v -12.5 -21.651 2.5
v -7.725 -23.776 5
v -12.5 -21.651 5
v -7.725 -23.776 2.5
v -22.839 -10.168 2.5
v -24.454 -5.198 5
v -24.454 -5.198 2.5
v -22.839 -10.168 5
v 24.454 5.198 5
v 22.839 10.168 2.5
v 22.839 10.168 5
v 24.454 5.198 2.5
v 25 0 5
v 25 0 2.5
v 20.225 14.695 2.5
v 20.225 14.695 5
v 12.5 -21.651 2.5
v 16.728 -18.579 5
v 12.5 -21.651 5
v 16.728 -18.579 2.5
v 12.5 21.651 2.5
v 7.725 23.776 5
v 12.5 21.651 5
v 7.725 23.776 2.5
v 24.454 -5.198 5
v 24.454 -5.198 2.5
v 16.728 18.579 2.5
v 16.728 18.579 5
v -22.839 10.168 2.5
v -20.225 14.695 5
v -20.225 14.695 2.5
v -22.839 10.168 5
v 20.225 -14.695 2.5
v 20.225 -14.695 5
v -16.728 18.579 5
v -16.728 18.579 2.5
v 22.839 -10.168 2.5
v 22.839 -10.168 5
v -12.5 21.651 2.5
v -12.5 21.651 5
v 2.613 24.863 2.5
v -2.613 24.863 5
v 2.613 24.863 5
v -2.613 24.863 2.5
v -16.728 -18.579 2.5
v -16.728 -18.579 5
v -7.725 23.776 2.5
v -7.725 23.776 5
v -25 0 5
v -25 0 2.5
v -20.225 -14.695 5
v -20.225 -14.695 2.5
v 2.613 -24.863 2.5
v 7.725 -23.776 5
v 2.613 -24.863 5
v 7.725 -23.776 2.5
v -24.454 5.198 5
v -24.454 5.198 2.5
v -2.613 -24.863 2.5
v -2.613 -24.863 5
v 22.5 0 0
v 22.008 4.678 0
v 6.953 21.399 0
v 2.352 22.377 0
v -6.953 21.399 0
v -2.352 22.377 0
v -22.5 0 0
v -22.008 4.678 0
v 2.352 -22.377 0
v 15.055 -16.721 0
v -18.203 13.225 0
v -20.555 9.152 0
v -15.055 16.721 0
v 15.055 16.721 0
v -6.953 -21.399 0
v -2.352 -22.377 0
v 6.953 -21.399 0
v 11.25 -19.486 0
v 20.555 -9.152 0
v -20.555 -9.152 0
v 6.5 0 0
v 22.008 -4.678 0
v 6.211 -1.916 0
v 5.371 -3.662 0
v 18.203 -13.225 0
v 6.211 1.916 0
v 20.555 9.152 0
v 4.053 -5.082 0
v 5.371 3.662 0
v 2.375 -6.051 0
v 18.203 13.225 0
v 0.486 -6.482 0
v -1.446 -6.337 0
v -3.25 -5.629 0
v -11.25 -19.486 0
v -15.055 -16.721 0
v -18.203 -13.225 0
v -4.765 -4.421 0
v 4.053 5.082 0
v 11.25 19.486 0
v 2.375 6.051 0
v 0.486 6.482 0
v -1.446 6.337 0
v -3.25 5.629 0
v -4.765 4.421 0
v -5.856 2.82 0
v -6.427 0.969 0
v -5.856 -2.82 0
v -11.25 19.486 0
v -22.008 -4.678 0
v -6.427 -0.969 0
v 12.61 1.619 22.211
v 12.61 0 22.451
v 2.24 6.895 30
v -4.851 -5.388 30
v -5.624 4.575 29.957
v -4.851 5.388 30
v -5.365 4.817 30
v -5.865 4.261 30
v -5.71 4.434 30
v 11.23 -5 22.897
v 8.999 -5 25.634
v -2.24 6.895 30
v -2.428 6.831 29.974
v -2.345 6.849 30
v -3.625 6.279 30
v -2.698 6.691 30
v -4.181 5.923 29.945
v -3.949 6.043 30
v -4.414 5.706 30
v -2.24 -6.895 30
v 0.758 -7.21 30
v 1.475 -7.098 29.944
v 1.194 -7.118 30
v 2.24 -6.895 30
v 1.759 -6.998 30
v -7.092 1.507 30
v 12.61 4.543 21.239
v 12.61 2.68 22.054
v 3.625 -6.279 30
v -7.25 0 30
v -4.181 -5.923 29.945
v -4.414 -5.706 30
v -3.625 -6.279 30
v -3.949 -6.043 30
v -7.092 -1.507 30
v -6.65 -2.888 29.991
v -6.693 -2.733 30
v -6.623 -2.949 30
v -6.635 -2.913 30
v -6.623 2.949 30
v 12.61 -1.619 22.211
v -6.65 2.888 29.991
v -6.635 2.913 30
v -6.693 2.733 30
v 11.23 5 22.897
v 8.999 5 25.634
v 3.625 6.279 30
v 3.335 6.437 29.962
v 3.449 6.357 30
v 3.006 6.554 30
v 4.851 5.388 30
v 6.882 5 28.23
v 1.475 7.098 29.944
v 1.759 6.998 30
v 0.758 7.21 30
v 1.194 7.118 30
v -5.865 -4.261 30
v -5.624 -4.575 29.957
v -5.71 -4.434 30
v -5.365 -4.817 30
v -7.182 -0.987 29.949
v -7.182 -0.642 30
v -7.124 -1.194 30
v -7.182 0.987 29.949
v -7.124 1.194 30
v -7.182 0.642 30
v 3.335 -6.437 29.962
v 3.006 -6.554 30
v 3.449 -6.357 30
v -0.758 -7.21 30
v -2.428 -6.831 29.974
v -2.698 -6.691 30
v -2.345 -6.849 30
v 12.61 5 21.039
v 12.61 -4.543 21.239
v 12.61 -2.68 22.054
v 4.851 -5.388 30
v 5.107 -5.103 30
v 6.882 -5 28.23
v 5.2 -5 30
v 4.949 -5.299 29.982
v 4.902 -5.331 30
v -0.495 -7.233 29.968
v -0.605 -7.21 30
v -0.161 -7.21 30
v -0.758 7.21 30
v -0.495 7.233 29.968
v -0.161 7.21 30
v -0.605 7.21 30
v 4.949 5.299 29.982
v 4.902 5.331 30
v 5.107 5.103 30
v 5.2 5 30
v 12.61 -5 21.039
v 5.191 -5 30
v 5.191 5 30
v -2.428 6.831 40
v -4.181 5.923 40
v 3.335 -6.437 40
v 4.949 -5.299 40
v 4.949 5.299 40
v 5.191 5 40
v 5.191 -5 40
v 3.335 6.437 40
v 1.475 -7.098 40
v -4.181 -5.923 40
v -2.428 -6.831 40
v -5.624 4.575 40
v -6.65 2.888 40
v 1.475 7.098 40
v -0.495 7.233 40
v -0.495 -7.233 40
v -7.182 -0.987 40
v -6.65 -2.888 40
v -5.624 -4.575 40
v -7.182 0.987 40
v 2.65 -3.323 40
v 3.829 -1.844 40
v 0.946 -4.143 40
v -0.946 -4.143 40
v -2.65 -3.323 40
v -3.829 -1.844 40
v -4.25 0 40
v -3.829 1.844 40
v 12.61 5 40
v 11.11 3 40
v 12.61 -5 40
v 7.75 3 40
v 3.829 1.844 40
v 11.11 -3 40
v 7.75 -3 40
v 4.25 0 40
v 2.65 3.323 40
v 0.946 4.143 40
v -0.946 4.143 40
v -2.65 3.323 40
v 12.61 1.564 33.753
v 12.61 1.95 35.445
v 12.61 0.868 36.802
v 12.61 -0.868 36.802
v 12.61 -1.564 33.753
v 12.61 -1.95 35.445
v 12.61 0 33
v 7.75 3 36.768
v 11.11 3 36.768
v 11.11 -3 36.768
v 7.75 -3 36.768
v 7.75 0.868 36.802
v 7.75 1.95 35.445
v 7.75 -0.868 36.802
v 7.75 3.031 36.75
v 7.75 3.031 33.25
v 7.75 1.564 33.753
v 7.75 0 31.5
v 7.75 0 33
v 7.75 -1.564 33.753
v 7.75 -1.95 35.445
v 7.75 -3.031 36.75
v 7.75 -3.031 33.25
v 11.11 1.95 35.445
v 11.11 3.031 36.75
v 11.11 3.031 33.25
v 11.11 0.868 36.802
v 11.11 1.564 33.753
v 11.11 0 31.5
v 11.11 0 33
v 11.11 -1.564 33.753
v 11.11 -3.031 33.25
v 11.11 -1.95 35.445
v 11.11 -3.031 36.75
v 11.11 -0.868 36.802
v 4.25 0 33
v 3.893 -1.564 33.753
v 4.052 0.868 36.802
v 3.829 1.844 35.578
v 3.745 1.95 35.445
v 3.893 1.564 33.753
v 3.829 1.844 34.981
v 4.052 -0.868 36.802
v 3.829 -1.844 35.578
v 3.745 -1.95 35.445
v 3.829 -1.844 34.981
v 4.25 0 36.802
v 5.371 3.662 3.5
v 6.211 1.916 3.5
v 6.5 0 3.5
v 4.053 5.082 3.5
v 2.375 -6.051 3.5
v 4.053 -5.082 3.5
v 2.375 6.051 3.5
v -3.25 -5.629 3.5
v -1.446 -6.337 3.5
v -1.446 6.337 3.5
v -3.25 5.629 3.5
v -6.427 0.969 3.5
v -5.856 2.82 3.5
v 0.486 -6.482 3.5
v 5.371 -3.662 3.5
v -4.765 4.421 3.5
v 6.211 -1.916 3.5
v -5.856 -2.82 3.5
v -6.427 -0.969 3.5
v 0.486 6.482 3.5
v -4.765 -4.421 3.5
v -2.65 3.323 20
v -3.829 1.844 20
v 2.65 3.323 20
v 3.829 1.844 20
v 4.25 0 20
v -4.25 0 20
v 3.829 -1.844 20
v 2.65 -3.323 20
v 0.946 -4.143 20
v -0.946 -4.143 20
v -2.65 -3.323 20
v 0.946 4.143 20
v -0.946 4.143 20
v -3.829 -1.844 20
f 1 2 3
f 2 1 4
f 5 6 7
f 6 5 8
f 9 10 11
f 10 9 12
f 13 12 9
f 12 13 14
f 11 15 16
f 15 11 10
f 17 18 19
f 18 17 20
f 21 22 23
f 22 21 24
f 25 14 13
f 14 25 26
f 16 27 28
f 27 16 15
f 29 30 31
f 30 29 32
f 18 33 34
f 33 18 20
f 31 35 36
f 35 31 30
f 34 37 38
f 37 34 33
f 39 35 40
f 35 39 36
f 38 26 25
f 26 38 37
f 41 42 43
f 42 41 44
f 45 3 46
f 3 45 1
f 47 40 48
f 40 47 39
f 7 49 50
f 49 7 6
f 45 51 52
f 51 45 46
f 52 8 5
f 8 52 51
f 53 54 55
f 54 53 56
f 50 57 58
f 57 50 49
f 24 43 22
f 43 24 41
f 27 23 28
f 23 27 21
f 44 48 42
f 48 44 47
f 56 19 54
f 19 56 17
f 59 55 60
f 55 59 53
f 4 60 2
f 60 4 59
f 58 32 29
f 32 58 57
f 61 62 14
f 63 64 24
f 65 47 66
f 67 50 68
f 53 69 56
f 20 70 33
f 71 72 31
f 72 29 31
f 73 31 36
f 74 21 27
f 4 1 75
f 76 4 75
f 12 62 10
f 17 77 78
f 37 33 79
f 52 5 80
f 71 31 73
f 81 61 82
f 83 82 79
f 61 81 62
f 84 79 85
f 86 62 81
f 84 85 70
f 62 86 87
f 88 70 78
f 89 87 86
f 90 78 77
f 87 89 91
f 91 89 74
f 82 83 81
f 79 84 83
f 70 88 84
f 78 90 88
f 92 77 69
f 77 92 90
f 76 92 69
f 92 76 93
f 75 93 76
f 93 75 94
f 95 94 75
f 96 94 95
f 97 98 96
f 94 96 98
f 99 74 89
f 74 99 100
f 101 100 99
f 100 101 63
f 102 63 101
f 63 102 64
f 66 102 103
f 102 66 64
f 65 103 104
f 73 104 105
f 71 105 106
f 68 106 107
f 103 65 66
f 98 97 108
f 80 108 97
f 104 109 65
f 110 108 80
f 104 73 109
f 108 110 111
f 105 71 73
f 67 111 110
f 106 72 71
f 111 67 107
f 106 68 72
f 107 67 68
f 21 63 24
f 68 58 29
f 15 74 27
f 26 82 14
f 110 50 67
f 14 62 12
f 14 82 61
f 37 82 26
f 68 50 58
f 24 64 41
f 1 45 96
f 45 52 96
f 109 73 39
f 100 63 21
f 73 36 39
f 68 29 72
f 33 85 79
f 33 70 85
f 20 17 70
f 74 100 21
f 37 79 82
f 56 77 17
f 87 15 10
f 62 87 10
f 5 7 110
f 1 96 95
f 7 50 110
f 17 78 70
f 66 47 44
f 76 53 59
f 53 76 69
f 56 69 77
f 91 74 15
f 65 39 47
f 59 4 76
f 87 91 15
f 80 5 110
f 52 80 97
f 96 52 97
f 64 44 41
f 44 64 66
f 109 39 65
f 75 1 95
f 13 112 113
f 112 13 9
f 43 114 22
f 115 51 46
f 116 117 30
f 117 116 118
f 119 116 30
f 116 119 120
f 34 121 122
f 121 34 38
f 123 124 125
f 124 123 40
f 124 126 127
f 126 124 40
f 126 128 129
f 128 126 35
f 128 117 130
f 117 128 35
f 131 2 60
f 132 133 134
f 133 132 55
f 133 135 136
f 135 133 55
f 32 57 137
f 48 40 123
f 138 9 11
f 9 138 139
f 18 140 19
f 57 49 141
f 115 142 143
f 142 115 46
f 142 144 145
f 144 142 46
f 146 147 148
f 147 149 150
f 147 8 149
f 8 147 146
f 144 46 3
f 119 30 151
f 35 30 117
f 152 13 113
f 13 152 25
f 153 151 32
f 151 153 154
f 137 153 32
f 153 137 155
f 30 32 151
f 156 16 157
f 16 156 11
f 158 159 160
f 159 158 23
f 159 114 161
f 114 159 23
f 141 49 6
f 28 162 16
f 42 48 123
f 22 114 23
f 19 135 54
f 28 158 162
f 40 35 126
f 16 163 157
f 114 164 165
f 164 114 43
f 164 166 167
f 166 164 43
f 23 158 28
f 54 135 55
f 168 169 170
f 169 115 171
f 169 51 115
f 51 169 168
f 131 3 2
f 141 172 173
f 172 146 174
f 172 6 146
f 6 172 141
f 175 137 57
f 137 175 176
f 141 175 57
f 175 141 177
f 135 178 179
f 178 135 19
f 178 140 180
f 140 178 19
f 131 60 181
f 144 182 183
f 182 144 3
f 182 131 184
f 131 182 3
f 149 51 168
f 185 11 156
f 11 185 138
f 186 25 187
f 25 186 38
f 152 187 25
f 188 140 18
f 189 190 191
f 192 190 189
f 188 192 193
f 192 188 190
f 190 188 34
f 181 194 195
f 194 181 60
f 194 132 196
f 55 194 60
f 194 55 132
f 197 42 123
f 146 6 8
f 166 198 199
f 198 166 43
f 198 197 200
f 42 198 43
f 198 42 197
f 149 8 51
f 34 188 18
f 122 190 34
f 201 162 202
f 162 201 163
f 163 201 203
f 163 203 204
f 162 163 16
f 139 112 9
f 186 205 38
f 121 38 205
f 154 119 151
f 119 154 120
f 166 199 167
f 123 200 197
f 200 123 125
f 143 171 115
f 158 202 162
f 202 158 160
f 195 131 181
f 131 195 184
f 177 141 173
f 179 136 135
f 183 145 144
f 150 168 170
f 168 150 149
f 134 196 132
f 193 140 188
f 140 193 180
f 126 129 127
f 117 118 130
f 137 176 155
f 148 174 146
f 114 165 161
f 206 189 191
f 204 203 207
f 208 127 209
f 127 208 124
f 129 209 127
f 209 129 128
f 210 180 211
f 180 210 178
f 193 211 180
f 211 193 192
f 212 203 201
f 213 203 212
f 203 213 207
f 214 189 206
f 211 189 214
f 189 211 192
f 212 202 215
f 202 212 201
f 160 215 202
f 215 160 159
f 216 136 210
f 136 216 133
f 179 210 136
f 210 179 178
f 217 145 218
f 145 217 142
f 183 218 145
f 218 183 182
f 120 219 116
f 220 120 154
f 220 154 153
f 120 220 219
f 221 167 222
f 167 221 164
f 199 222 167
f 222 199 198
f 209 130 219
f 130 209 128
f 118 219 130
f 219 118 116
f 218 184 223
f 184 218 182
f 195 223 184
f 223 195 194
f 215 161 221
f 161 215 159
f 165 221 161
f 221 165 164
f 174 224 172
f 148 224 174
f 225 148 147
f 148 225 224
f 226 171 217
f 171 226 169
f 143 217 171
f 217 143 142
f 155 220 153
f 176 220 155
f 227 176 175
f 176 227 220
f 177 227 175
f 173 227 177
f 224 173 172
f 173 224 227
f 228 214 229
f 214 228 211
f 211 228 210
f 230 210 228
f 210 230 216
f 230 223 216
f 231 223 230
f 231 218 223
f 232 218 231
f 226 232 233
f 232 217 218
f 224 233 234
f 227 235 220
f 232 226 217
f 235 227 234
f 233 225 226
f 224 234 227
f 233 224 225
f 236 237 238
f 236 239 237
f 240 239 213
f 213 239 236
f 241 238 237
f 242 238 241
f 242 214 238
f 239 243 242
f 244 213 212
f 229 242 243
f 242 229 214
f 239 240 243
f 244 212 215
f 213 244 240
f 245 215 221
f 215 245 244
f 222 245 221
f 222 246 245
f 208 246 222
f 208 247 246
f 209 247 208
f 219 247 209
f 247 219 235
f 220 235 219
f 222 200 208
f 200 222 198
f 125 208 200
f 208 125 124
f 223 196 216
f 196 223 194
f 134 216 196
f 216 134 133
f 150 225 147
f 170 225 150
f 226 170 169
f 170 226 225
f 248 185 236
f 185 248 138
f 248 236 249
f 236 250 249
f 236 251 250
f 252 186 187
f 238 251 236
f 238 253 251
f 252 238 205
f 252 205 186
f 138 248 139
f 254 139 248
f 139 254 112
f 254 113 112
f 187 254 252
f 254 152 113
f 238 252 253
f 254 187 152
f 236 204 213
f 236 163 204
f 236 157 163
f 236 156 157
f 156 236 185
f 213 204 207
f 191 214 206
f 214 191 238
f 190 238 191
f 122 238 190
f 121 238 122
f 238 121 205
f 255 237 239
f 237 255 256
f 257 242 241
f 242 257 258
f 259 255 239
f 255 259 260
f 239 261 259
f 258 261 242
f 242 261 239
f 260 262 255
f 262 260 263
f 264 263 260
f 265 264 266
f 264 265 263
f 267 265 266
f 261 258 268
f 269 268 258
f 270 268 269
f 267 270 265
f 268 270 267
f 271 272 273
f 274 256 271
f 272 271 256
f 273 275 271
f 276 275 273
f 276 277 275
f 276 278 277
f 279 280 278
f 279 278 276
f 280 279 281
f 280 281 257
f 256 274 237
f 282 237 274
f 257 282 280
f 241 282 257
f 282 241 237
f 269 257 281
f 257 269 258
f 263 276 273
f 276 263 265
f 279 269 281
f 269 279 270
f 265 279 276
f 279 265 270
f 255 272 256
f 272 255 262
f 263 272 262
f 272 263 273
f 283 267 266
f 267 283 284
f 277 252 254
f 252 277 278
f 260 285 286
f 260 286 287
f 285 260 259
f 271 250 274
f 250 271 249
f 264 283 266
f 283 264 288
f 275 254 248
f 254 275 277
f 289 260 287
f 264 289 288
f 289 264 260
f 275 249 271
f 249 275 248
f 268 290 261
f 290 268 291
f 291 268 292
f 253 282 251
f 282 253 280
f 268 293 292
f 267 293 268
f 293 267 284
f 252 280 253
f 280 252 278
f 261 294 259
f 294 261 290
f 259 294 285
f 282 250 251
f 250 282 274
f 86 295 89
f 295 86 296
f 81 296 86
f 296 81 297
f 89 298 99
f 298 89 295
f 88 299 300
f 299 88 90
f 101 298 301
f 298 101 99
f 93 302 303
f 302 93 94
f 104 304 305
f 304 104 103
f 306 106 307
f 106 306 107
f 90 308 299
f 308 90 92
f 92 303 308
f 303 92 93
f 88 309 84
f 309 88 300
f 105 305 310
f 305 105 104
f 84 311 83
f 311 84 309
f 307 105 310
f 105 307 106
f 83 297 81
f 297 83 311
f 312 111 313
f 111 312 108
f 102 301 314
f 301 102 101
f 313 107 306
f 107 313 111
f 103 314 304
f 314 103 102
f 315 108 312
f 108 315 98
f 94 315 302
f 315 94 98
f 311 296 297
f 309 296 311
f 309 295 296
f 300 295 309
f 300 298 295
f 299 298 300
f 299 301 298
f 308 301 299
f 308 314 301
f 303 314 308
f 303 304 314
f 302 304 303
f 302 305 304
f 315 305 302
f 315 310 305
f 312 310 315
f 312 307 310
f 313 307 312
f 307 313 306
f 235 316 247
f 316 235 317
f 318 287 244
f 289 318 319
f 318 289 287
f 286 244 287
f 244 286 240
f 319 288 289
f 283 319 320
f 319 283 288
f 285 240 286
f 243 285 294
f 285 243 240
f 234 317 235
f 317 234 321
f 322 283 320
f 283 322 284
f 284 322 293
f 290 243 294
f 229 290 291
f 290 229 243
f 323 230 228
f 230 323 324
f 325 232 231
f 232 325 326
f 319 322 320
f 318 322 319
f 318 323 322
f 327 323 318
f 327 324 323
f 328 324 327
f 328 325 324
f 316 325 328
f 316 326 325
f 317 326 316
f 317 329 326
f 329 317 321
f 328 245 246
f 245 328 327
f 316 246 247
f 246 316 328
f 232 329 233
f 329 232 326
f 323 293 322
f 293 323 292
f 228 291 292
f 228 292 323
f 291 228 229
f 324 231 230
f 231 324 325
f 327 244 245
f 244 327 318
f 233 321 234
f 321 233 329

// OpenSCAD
// Optics base with and without magnet, with optional nut and bolt, which also makes a good safety cap when inverted.
// "it's a floor wax AND dessert topping!"

// Based on http://www.thingiverse.com/thing:28133  by jpearce
// ccox - Customization options added, height defined as a whole, chamfer option added, bolt option added

//CUSTOMIZER VARIABLES

// Height of base, in mm
base_height= 40;  // [10:100]

// Diameter of base, in mm
base_diameter= 50;   // [10:100]

// Diameter of rod, in mm
rod_diameter= 8;  // [2:0.1:30]

// depth of rod inside base, in mm
rod_depth= 20;  // [5:0.1:80]

// Margin for support around rod, in mm
rod_margin= 3;  // [1:0.1:20]


// Include hole on bottom for magnet, boolean
magnet_hole= 1;   // [0:false, 1:true]

// Diameter of magnet hole, in mm
magnet_diameter= 13;  // [2:1:30]

// Thickness/Height of magnet hole, in mm
magnet_thickness= 3.5;  // [2:0.5:20]


// Chamfer bottom edge, boolean
chamfer_edge= 1;   // [0:false, 1:true]


// Include bolt and nut to secure rod, boolean
include_bolt= 1;   // [0:false, 1:true]

// Bolt diameter, in mm
bolt_diameter = 3.0;    // [2:0.1:20]

// Nut diameter, in mm
nut_diameter = 6.0;  // [3:0.1:40]

// Nut thickness, in mm
nut_thickness = 2.8;  // [2:0.1:30]

// Nut holder margin for strength, in mm
nut_margin = 4;  // [2:0.1:30]

//CUSTOMIZER VARIABLES END


// how much extra space to allow in nut trap
nut_space_factor = 1.2;


// Sanity checks
if(base_height<=rod_depth)
{
    echo("<B>Error: Rod goes through base</B>");
}

if(rod_diameter>=base_diameter)
{
    echo("<B>Error: Base too small for rod</B>");
}

nut_trap_len = nut_thickness*nut_space_factor;
section_height = base_height / 8;


// our object, flat on XY plane for easy STL generation
optics_base();

module optics_base() {
   
    base_radius = base_diameter / 2;
    rod_radius = (rod_diameter+0.5)/2;  // should be almost tight
    bolt_rad= (bolt_diameter+1)/2;  // this should be sorta loose
    support_radius = rod_radius + rod_margin;
    magnet_radius = magnet_diameter / 2;
    nut_block_len = rod_radius + rod_margin + nut_trap_len + nut_margin/2;
    nut_block_width = nut_diameter + nut_margin;

    difference(){
        
        union() {
            
            // lower section
            if (chamfer_edge == 1) {
                half_section = section_height/2;
                translate([0,0,half_section])
                    cylinder(half_section,base_radius,base_radius);
                cylinder(half_section,base_radius-half_section,base_radius);
            } else {
                cylinder(section_height,base_radius,base_radius);
            }
            
            // sloping section
            translate([0,0,section_height])
                cylinder(section_height*5,base_radius,support_radius);
            
            // support for rod
            cylinder(base_height,support_radius,support_radius);
            
            if (include_bolt == 1) {
                translate([0,-nut_block_width/2,0])
                    cube([nut_block_len,nut_block_width,base_height]);
            }
        }
        
        // our optional magnet hole
        if (magnet_hole == 1){
            cylinder(magnet_thickness,magnet_radius,magnet_radius);
        }

        // rod clamp nut and bolt hole
        if (include_bolt == 1) {
           nut_x = nut_block_len - nut_trap_len - rod_margin/2;
           nut_y = 0;
           nut_z = base_height - section_height;
           translate([nut_x,nut_y,nut_z])
              rotate([0,0,90])
                nuttrap();
           translate([0,nut_y,nut_z])
              rotate([0,90,0])
                cylinder(support_radius*2,bolt_rad,bolt_rad);
        }
        
        // the rod
        rod_height = base_height - rod_depth;
#        translate([0,0,rod_height])
            cylinder(10+rod_depth*2,rod_radius,rod_radius);
    }
    
}

module hexagon(height,radius) 
{
  linear_extrude(height)
    circle(radius,$fn=6);
}

module nuttrap(){
  translate([0,-nut_trap_len/2,(section_height+6)/2])
    cube([nut_diameter,nut_trap_len,section_height+6],center =true);
  rotate([90,360/12,0]) // so point is down, nut trapped by straight sides
    hexagon(nut_trap_len,(nut_diameter+1)/2);
}

// ok, it had to be said:  "All your base are belong to us"   :-)
